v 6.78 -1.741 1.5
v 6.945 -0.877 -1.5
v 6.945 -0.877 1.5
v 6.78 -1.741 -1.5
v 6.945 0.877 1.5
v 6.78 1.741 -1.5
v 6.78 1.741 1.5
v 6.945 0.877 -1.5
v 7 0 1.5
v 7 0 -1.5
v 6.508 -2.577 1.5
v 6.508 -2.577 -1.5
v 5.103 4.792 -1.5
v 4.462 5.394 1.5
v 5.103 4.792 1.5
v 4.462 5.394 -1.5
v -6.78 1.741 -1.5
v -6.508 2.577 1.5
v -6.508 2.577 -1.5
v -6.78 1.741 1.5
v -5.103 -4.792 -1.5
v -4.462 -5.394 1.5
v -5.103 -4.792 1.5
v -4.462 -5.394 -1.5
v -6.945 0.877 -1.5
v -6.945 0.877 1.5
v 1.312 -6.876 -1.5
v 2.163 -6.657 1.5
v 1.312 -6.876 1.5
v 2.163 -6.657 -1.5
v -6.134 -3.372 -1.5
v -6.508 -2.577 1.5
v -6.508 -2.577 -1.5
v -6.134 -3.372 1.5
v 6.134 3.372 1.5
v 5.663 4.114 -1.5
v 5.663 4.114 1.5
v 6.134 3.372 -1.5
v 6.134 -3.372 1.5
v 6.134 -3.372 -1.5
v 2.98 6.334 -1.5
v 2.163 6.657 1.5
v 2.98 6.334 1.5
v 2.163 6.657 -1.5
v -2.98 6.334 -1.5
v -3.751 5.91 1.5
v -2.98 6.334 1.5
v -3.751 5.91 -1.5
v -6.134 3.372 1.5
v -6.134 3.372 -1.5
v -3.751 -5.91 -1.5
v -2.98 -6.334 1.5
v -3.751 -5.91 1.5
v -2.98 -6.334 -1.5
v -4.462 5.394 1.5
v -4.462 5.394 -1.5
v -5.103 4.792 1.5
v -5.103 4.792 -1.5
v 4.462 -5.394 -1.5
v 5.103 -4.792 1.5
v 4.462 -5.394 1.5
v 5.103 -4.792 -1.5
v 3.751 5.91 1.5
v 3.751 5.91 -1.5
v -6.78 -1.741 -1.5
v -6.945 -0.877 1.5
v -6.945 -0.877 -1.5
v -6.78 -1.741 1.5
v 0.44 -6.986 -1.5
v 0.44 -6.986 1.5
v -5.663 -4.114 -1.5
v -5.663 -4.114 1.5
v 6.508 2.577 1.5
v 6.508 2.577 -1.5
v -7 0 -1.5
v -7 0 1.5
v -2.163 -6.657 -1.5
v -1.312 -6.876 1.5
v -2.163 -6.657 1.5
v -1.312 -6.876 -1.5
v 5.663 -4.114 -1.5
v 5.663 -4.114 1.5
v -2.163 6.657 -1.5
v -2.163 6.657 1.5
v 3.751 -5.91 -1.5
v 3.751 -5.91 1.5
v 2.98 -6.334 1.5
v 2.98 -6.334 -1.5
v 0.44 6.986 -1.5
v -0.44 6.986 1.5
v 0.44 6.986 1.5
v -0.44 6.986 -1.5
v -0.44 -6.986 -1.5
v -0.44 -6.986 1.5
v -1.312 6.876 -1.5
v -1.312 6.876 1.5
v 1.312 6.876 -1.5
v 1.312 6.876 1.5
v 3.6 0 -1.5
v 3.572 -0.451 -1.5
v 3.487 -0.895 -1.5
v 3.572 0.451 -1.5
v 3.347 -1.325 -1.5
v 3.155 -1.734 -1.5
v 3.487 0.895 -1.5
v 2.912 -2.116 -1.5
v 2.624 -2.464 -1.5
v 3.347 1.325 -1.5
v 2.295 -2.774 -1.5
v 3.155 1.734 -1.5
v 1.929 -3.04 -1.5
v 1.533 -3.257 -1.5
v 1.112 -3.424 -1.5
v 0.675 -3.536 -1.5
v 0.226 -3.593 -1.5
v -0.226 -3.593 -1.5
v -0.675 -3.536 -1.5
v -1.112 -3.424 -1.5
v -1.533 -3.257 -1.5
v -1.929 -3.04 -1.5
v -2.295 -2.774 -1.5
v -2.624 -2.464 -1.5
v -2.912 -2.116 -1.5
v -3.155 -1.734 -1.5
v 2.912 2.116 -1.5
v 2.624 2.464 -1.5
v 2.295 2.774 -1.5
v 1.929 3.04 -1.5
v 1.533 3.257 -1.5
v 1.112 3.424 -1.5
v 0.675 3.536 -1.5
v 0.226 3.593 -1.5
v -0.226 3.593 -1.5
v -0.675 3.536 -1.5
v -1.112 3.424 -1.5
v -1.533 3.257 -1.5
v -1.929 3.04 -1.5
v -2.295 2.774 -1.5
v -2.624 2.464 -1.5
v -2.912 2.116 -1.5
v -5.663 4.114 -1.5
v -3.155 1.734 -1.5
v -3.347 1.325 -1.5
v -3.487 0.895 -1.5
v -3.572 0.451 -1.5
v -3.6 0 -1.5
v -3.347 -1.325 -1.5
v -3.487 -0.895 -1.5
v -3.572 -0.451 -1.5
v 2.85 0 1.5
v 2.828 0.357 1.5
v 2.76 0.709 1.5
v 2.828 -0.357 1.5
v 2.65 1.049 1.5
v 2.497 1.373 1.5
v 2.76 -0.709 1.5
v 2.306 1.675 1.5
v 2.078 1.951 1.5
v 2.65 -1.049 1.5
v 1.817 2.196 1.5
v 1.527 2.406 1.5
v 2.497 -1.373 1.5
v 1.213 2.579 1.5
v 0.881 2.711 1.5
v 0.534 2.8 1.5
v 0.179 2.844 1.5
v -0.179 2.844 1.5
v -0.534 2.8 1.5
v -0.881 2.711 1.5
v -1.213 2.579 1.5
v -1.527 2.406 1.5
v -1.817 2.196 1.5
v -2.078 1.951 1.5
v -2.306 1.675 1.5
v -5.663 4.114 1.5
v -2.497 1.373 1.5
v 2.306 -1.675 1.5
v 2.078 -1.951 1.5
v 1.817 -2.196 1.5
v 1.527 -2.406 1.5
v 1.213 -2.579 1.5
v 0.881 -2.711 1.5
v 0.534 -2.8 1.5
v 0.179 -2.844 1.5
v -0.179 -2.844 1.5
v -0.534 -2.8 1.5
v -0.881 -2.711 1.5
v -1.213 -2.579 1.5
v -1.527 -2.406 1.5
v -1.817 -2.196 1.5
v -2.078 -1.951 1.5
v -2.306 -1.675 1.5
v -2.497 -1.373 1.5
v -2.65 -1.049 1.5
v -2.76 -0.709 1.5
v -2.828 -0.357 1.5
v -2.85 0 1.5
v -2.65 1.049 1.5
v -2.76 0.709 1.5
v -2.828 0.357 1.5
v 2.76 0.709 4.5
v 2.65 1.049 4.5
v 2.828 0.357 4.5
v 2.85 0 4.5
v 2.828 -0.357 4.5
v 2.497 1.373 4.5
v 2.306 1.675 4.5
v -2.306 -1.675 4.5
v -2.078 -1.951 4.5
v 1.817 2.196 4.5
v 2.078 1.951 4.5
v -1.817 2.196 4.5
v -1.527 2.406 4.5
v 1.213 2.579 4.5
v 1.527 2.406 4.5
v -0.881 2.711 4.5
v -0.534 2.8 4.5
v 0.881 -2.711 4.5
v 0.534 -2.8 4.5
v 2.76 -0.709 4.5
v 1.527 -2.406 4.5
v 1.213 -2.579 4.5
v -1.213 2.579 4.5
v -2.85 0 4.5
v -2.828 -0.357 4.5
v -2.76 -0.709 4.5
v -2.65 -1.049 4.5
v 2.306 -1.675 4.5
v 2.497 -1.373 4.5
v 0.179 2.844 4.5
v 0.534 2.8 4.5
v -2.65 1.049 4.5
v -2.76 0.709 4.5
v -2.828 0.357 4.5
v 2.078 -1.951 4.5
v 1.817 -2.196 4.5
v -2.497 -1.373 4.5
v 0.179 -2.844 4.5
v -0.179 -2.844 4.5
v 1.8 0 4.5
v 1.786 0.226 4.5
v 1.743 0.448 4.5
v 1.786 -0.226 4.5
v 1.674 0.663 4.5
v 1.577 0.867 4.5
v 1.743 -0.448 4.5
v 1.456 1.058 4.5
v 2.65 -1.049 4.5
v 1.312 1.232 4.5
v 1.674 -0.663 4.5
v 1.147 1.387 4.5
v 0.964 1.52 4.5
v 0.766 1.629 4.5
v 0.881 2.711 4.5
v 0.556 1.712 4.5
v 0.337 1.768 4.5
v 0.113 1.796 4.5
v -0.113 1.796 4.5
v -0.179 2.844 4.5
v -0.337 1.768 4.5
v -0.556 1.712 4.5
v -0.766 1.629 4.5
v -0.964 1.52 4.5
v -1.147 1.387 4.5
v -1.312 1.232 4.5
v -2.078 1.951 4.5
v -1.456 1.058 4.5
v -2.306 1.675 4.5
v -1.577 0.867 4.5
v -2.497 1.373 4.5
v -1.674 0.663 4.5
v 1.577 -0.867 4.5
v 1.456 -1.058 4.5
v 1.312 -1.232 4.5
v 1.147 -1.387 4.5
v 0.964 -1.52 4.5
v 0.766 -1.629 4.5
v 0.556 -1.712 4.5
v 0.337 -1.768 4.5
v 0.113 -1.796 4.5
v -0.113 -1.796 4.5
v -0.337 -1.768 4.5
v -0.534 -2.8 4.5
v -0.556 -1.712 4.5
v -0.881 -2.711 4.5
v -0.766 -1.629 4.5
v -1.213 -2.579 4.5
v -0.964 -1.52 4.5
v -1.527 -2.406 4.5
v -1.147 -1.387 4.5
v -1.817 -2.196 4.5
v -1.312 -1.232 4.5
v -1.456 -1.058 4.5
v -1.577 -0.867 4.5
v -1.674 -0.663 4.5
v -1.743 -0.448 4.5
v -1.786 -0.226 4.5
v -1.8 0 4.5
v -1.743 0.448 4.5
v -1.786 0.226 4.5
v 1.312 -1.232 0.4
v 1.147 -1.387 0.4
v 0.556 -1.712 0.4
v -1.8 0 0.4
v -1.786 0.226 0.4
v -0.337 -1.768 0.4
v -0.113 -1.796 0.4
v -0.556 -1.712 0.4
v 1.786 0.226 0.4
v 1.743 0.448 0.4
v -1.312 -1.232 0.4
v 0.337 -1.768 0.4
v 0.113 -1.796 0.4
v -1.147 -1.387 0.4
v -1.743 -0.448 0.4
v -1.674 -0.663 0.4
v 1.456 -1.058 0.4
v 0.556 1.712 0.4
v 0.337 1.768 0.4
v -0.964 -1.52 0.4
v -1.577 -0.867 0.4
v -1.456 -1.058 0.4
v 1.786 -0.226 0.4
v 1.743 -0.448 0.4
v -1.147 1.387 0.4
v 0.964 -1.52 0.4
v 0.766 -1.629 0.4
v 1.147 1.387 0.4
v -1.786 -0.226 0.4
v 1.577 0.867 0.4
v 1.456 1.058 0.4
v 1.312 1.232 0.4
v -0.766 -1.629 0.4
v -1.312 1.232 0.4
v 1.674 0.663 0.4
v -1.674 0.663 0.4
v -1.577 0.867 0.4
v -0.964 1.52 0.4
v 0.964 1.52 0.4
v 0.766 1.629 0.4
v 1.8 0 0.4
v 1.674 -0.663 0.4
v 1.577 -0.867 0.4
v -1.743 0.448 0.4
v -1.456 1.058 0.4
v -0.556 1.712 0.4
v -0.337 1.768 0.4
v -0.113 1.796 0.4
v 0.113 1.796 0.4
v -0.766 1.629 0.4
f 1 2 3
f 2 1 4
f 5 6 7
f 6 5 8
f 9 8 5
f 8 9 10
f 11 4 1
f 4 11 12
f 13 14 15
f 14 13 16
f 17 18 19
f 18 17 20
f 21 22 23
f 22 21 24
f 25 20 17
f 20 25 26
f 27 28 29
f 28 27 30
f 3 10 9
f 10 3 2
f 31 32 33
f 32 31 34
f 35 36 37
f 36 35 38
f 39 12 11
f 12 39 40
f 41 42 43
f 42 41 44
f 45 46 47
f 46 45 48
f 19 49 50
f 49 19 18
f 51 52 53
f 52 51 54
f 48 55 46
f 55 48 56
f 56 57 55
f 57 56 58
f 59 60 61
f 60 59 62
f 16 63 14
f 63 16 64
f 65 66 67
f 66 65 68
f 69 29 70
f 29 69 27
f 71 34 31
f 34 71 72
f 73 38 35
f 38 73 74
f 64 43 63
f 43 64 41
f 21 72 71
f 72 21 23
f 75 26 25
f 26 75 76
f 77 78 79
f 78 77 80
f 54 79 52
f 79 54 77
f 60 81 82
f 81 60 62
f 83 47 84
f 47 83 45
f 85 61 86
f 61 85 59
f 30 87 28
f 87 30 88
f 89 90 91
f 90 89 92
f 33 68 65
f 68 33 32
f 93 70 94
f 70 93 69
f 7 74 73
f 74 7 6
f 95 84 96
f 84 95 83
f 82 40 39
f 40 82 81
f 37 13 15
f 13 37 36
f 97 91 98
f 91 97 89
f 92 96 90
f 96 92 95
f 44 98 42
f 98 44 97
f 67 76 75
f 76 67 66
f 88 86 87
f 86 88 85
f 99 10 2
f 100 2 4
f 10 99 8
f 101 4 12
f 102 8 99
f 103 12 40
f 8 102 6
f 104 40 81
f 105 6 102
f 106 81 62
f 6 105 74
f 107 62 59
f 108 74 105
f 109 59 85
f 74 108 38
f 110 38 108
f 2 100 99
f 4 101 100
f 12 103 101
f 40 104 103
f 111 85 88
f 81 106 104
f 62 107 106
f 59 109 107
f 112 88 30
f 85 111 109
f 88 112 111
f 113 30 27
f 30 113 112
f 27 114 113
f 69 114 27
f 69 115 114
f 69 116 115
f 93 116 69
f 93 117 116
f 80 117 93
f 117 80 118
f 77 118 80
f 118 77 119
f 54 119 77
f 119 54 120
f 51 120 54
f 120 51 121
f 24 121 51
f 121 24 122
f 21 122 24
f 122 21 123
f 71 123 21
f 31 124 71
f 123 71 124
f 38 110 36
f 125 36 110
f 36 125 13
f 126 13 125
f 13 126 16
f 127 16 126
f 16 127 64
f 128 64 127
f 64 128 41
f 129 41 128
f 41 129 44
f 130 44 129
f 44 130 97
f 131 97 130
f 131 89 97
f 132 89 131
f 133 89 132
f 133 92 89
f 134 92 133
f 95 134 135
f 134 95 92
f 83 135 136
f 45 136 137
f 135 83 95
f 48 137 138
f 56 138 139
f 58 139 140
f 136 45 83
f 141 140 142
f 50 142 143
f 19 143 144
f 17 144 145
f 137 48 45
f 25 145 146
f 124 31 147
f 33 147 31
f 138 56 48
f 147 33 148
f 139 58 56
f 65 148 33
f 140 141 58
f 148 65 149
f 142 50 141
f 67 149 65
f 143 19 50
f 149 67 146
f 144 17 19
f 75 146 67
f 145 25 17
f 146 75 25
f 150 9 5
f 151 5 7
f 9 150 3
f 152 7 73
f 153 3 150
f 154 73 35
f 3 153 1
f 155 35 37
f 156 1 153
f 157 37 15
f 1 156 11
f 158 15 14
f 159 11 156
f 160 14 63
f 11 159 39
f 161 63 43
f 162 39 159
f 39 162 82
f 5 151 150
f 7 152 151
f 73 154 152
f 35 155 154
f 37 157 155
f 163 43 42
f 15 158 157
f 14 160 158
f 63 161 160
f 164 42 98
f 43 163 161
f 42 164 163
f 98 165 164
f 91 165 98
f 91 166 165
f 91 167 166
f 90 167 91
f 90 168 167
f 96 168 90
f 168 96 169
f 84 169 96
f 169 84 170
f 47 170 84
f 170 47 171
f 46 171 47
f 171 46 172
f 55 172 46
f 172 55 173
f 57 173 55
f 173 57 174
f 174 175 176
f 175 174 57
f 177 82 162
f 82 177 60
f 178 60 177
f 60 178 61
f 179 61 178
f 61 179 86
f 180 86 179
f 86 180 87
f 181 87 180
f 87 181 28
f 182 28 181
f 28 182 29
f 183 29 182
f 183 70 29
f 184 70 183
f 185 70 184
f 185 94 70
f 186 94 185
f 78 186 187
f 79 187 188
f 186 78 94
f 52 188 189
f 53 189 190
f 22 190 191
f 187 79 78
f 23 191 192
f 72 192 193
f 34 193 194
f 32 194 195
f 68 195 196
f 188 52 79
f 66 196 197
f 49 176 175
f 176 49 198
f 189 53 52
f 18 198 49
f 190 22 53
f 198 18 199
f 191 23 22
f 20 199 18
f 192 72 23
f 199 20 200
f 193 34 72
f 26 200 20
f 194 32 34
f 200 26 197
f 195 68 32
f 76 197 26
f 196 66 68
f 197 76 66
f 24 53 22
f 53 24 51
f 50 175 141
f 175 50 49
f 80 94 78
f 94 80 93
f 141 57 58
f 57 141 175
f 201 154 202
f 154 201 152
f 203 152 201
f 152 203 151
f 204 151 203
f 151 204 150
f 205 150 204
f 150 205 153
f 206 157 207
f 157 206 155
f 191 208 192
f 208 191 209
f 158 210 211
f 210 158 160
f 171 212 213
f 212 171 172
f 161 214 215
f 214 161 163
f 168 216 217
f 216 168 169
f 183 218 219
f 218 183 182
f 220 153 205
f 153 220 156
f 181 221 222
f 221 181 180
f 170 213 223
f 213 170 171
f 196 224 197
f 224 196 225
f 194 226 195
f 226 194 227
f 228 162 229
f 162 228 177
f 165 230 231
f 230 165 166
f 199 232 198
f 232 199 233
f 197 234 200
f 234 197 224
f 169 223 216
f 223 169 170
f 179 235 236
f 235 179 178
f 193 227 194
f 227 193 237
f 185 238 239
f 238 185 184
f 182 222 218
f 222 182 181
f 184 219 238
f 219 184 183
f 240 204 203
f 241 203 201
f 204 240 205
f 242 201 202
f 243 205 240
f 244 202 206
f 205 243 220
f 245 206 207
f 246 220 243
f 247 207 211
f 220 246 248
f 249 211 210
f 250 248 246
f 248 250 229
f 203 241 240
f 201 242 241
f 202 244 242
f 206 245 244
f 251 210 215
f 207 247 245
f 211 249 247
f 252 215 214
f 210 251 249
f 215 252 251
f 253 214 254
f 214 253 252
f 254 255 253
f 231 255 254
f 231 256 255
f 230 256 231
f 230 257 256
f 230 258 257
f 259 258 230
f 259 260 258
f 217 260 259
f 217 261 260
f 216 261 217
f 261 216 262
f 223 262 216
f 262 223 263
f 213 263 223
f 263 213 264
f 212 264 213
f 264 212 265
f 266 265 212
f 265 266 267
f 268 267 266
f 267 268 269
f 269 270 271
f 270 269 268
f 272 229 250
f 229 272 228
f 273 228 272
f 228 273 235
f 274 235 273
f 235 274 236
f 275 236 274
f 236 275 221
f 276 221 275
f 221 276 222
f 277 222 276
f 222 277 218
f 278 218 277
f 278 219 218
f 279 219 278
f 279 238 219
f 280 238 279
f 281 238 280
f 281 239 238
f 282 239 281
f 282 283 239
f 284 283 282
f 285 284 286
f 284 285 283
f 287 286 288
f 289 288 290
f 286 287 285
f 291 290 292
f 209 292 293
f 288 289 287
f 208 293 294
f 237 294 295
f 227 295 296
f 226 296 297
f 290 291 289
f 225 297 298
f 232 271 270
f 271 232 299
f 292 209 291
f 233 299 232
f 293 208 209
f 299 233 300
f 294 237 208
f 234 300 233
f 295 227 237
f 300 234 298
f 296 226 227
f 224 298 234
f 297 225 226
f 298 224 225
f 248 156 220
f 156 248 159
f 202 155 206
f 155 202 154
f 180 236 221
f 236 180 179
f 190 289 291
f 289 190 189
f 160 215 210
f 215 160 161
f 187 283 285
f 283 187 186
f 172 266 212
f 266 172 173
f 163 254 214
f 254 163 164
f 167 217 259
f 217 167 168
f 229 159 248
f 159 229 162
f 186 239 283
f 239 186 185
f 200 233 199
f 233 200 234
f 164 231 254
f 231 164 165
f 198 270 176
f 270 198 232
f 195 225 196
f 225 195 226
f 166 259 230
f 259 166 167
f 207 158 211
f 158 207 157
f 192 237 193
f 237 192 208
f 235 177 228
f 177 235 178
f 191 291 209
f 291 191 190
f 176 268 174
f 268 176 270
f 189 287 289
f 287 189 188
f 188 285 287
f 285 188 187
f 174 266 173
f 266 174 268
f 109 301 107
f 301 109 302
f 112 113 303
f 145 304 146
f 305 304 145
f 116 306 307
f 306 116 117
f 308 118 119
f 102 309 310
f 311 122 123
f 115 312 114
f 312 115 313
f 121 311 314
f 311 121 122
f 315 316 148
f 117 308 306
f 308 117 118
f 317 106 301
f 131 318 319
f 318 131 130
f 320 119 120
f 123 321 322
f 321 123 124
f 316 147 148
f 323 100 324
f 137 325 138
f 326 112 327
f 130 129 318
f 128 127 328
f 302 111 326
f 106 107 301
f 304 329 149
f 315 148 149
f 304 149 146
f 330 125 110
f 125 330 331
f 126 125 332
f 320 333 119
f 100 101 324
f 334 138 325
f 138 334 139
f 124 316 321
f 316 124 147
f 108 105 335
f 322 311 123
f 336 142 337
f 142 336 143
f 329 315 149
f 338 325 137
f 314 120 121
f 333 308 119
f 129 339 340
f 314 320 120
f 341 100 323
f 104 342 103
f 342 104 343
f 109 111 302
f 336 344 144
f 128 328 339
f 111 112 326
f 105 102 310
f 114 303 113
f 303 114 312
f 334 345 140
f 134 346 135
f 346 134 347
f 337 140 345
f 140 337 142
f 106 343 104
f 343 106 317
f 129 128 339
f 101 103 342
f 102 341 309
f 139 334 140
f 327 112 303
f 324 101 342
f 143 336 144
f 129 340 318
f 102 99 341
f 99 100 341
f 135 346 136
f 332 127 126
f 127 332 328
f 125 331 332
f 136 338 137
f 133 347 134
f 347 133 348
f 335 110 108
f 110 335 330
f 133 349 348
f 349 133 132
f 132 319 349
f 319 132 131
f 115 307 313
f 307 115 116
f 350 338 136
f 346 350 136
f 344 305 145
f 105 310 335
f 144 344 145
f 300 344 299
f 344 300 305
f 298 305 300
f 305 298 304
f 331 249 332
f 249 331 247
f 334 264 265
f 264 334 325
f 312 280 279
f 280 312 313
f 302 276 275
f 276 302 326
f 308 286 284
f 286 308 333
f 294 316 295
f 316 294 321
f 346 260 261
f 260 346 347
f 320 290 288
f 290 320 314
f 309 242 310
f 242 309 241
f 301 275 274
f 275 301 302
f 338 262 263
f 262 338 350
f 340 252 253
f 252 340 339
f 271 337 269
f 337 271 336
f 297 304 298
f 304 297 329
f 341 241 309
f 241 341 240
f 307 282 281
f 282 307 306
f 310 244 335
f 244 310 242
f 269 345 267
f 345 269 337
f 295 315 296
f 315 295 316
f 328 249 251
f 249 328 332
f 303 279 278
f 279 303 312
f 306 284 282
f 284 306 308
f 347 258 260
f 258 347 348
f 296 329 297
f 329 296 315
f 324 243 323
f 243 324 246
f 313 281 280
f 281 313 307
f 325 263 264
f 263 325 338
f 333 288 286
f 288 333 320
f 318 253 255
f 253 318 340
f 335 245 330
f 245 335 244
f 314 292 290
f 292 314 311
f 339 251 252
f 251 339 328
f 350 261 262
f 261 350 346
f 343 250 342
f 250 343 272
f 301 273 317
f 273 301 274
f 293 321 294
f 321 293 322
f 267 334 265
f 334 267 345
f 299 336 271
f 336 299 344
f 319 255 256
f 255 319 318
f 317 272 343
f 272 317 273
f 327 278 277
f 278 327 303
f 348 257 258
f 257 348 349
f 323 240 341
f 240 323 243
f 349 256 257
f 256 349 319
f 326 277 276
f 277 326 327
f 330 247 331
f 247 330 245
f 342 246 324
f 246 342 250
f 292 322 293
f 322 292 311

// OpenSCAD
$fn = 50;


difference() {
	union() {
		translate(v = [0, 0, -1.5000000000]) {
			cylinder(h = 3, r = 7.0000000000);
		}
		translate(v = [0, 0, -1.5000000000]) {
			cylinder(h = 6, r = 2.8500000000);
		}
	}
	union() {
		translate(v = [0, 0, -1.5000000000]) {
			rotate(a = [0, 180, 0]) {
				difference() {
					union() {
						translate(v = [0, 0, -6.0000000000]) {
							cylinder(h = 6, r = 1.5000000000);
						}
						translate(v = [0, 0, -1.9000000000]) {
							cylinder(h = 1.9000000000, r1 = 1.8000000000, r2 = 3.6000000000);
						}
						translate(v = [0, 0, -6.0000000000]) {
							cylinder(h = 6, r = 1.8000000000);
						}
						translate(v = [0, 0, -6.0000000000]) {
							cylinder(h = 6, r = 1.5000000000);
						}
					}
					union();
				}
			}
		}
		translate(v = [0, 0, -100.0000000000]) {
			cylinder(h = 200, r = 1.8000000000);
		}
	}
}
